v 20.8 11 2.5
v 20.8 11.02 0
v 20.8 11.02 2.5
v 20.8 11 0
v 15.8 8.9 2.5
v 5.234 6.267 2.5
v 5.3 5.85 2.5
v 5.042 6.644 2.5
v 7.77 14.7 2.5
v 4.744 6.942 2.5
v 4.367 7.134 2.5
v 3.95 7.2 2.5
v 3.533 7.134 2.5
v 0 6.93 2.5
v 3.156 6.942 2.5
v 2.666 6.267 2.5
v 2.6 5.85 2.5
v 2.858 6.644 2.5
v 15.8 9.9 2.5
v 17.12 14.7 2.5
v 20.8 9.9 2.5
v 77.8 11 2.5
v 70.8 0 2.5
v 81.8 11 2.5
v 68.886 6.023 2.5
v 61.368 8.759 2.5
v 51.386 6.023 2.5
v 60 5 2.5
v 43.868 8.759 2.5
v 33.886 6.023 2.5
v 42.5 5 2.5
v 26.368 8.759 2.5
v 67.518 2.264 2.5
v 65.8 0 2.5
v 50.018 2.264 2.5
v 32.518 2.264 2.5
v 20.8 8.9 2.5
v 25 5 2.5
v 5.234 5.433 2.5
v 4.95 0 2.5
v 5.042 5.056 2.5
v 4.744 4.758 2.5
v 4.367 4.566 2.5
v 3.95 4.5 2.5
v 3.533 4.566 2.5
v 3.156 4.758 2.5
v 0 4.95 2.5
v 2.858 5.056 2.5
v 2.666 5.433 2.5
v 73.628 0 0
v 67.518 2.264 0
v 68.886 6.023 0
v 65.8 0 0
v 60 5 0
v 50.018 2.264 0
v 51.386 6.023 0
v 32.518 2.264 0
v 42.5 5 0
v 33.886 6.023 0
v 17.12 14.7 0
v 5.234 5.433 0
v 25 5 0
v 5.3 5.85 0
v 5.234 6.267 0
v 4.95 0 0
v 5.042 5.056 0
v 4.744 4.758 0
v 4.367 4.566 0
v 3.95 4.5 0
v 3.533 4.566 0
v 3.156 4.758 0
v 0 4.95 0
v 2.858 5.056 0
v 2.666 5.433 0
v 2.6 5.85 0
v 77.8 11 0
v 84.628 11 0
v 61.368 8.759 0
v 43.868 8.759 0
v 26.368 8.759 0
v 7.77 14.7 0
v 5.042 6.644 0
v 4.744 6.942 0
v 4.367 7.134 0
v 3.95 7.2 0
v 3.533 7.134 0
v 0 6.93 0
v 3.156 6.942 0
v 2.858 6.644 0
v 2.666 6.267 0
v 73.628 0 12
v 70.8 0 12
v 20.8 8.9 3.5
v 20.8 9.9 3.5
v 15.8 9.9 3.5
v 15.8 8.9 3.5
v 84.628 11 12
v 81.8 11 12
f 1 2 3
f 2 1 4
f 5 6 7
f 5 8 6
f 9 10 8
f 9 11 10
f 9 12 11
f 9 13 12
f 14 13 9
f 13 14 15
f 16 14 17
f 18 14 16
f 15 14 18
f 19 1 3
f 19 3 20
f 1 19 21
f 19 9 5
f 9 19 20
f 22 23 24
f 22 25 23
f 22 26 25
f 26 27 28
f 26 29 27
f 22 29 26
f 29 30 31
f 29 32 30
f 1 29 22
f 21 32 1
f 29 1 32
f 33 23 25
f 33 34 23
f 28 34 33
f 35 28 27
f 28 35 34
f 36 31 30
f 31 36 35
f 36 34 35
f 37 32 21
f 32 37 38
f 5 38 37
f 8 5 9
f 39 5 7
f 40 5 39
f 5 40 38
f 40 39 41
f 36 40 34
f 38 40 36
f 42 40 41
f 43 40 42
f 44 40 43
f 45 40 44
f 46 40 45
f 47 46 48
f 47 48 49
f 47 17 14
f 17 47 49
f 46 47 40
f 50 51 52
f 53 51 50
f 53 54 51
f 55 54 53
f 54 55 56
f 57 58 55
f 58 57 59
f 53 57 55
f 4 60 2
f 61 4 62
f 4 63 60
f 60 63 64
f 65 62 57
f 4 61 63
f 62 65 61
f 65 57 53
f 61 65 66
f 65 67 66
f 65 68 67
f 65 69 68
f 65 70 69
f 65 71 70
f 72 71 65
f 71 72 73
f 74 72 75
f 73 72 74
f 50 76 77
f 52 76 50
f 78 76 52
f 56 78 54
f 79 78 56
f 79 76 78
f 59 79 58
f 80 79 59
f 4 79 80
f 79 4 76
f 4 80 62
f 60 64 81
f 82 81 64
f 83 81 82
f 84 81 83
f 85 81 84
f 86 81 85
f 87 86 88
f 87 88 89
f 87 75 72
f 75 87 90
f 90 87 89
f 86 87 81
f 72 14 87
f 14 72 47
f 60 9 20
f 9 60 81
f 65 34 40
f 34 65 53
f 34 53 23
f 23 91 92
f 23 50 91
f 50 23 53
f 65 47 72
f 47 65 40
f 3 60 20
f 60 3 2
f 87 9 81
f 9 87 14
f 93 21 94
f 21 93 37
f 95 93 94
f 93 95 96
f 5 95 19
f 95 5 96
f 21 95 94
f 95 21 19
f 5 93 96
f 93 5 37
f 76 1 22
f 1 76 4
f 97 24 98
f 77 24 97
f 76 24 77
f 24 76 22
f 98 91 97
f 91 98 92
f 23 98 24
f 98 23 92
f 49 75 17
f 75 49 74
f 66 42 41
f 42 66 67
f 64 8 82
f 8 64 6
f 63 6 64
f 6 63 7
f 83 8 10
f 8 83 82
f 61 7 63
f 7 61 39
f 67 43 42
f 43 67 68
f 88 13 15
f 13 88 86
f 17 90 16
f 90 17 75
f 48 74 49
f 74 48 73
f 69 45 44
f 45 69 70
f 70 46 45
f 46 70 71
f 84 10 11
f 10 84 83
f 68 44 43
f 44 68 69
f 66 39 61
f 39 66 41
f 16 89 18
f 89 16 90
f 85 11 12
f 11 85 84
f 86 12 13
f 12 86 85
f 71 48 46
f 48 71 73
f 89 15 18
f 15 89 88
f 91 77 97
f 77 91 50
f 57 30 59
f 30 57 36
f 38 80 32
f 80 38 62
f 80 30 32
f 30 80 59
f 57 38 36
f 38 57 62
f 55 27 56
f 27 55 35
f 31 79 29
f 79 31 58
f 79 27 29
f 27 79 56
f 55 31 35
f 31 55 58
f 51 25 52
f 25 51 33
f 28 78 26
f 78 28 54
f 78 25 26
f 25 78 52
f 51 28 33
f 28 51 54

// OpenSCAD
/*
 * Created by:
 * Thomas Buck <xythobuz@xythobuz.de> in June 2016
 *
 * Licensed under the
 * Creative Commons - Attribution - Share Alike license.
 */

// -----------------------------------------------------------

head_height = 14.7;
head_width = 20.8;
head_intersect_angle = 225;
head_intersect_x = 19;
head_intersect_y = 21;
head_intersect_off_x = -3.5;
head_intersect_off_y = -4.9;
nub_width = 5;
nub_height = 1;
nub_depth = 1;
nub_off = 8.9;
hole = 2.7;
hole_dist_x = 3.95;
hole_dist_y = 5.85;
height = 2.5;
arm_height = 11;
arm_width = 65;
foot_height = 12;
foot_length = 20;
foot_angle = 45;
foot_off_x = -16;
foot_off_y = -1;

cutout_1_width = 8;
cutout_1_height = 4;
cutout_1_x = 25;
cutout_1_y = 5;
cutout_1_angle = 20;

cutout_2_width = 8;
cutout_2_height = 4;
cutout_2_x = 42.5;
cutout_2_y = 5;
cutout_2_angle = 20;

cutout_3_width = 8;
cutout_3_height = 4;
cutout_3_x = 60;
cutout_3_y = 5;
cutout_3_angle = 20;

$fn = 20;

// -----------------------------------------------------------

difference() {
    union() {
        intersection() {
            cube([head_width, head_height, height]);
            rotate([0, 0, head_intersect_angle])
                translate([-head_intersect_x + head_intersect_off_x, head_intersect_off_y, 0])
                cube([head_intersect_x, head_intersect_y, height]);
        }
        
        translate([head_width - nub_width, nub_off, height])
            cube([nub_width, nub_height, nub_depth]);
        
        translate([head_width, 0, 0])
            cube([arm_width, arm_height, height]);

        translate([head_width + arm_width + foot_off_x, foot_off_y, 0])
            rotate([0, 0, -foot_angle])
            cube([height, foot_length, foot_height]);
    }
    
    translate([hole_dist_x, hole_dist_y, -1])
        cylinder(d = hole, h = height + 2);
    
    translate([head_width + arm_width - 20, -10, -1])
        cube([10, 10, 10 + foot_height]);

    translate([head_width + arm_width - 8, arm_height, -1])
        cube([10, 10, 10 + foot_height]);
    
    translate([head_width + arm_width + foot_off_x, foot_off_y, -1])
            rotate([0, 0, -foot_angle])
            translate([2, 0, 0])
            cube([10, 20, 10 + foot_height]);
    
    translate([cutout_1_x, cutout_1_y, -1])
        rotate([0, 0, -cutout_1_angle])
        cube([cutout_1_width, cutout_1_height, height + 2]);
    
    translate([cutout_2_x, cutout_2_y, -1])
        rotate([0, 0, -cutout_2_angle])
        cube([cutout_2_width, cutout_2_height, height + 2]);
        
    translate([cutout_3_x, cutout_3_y, -1])
        rotate([0, 0, -cutout_3_angle])
        cube([cutout_3_width, cutout_3_height, height + 2]);
}
